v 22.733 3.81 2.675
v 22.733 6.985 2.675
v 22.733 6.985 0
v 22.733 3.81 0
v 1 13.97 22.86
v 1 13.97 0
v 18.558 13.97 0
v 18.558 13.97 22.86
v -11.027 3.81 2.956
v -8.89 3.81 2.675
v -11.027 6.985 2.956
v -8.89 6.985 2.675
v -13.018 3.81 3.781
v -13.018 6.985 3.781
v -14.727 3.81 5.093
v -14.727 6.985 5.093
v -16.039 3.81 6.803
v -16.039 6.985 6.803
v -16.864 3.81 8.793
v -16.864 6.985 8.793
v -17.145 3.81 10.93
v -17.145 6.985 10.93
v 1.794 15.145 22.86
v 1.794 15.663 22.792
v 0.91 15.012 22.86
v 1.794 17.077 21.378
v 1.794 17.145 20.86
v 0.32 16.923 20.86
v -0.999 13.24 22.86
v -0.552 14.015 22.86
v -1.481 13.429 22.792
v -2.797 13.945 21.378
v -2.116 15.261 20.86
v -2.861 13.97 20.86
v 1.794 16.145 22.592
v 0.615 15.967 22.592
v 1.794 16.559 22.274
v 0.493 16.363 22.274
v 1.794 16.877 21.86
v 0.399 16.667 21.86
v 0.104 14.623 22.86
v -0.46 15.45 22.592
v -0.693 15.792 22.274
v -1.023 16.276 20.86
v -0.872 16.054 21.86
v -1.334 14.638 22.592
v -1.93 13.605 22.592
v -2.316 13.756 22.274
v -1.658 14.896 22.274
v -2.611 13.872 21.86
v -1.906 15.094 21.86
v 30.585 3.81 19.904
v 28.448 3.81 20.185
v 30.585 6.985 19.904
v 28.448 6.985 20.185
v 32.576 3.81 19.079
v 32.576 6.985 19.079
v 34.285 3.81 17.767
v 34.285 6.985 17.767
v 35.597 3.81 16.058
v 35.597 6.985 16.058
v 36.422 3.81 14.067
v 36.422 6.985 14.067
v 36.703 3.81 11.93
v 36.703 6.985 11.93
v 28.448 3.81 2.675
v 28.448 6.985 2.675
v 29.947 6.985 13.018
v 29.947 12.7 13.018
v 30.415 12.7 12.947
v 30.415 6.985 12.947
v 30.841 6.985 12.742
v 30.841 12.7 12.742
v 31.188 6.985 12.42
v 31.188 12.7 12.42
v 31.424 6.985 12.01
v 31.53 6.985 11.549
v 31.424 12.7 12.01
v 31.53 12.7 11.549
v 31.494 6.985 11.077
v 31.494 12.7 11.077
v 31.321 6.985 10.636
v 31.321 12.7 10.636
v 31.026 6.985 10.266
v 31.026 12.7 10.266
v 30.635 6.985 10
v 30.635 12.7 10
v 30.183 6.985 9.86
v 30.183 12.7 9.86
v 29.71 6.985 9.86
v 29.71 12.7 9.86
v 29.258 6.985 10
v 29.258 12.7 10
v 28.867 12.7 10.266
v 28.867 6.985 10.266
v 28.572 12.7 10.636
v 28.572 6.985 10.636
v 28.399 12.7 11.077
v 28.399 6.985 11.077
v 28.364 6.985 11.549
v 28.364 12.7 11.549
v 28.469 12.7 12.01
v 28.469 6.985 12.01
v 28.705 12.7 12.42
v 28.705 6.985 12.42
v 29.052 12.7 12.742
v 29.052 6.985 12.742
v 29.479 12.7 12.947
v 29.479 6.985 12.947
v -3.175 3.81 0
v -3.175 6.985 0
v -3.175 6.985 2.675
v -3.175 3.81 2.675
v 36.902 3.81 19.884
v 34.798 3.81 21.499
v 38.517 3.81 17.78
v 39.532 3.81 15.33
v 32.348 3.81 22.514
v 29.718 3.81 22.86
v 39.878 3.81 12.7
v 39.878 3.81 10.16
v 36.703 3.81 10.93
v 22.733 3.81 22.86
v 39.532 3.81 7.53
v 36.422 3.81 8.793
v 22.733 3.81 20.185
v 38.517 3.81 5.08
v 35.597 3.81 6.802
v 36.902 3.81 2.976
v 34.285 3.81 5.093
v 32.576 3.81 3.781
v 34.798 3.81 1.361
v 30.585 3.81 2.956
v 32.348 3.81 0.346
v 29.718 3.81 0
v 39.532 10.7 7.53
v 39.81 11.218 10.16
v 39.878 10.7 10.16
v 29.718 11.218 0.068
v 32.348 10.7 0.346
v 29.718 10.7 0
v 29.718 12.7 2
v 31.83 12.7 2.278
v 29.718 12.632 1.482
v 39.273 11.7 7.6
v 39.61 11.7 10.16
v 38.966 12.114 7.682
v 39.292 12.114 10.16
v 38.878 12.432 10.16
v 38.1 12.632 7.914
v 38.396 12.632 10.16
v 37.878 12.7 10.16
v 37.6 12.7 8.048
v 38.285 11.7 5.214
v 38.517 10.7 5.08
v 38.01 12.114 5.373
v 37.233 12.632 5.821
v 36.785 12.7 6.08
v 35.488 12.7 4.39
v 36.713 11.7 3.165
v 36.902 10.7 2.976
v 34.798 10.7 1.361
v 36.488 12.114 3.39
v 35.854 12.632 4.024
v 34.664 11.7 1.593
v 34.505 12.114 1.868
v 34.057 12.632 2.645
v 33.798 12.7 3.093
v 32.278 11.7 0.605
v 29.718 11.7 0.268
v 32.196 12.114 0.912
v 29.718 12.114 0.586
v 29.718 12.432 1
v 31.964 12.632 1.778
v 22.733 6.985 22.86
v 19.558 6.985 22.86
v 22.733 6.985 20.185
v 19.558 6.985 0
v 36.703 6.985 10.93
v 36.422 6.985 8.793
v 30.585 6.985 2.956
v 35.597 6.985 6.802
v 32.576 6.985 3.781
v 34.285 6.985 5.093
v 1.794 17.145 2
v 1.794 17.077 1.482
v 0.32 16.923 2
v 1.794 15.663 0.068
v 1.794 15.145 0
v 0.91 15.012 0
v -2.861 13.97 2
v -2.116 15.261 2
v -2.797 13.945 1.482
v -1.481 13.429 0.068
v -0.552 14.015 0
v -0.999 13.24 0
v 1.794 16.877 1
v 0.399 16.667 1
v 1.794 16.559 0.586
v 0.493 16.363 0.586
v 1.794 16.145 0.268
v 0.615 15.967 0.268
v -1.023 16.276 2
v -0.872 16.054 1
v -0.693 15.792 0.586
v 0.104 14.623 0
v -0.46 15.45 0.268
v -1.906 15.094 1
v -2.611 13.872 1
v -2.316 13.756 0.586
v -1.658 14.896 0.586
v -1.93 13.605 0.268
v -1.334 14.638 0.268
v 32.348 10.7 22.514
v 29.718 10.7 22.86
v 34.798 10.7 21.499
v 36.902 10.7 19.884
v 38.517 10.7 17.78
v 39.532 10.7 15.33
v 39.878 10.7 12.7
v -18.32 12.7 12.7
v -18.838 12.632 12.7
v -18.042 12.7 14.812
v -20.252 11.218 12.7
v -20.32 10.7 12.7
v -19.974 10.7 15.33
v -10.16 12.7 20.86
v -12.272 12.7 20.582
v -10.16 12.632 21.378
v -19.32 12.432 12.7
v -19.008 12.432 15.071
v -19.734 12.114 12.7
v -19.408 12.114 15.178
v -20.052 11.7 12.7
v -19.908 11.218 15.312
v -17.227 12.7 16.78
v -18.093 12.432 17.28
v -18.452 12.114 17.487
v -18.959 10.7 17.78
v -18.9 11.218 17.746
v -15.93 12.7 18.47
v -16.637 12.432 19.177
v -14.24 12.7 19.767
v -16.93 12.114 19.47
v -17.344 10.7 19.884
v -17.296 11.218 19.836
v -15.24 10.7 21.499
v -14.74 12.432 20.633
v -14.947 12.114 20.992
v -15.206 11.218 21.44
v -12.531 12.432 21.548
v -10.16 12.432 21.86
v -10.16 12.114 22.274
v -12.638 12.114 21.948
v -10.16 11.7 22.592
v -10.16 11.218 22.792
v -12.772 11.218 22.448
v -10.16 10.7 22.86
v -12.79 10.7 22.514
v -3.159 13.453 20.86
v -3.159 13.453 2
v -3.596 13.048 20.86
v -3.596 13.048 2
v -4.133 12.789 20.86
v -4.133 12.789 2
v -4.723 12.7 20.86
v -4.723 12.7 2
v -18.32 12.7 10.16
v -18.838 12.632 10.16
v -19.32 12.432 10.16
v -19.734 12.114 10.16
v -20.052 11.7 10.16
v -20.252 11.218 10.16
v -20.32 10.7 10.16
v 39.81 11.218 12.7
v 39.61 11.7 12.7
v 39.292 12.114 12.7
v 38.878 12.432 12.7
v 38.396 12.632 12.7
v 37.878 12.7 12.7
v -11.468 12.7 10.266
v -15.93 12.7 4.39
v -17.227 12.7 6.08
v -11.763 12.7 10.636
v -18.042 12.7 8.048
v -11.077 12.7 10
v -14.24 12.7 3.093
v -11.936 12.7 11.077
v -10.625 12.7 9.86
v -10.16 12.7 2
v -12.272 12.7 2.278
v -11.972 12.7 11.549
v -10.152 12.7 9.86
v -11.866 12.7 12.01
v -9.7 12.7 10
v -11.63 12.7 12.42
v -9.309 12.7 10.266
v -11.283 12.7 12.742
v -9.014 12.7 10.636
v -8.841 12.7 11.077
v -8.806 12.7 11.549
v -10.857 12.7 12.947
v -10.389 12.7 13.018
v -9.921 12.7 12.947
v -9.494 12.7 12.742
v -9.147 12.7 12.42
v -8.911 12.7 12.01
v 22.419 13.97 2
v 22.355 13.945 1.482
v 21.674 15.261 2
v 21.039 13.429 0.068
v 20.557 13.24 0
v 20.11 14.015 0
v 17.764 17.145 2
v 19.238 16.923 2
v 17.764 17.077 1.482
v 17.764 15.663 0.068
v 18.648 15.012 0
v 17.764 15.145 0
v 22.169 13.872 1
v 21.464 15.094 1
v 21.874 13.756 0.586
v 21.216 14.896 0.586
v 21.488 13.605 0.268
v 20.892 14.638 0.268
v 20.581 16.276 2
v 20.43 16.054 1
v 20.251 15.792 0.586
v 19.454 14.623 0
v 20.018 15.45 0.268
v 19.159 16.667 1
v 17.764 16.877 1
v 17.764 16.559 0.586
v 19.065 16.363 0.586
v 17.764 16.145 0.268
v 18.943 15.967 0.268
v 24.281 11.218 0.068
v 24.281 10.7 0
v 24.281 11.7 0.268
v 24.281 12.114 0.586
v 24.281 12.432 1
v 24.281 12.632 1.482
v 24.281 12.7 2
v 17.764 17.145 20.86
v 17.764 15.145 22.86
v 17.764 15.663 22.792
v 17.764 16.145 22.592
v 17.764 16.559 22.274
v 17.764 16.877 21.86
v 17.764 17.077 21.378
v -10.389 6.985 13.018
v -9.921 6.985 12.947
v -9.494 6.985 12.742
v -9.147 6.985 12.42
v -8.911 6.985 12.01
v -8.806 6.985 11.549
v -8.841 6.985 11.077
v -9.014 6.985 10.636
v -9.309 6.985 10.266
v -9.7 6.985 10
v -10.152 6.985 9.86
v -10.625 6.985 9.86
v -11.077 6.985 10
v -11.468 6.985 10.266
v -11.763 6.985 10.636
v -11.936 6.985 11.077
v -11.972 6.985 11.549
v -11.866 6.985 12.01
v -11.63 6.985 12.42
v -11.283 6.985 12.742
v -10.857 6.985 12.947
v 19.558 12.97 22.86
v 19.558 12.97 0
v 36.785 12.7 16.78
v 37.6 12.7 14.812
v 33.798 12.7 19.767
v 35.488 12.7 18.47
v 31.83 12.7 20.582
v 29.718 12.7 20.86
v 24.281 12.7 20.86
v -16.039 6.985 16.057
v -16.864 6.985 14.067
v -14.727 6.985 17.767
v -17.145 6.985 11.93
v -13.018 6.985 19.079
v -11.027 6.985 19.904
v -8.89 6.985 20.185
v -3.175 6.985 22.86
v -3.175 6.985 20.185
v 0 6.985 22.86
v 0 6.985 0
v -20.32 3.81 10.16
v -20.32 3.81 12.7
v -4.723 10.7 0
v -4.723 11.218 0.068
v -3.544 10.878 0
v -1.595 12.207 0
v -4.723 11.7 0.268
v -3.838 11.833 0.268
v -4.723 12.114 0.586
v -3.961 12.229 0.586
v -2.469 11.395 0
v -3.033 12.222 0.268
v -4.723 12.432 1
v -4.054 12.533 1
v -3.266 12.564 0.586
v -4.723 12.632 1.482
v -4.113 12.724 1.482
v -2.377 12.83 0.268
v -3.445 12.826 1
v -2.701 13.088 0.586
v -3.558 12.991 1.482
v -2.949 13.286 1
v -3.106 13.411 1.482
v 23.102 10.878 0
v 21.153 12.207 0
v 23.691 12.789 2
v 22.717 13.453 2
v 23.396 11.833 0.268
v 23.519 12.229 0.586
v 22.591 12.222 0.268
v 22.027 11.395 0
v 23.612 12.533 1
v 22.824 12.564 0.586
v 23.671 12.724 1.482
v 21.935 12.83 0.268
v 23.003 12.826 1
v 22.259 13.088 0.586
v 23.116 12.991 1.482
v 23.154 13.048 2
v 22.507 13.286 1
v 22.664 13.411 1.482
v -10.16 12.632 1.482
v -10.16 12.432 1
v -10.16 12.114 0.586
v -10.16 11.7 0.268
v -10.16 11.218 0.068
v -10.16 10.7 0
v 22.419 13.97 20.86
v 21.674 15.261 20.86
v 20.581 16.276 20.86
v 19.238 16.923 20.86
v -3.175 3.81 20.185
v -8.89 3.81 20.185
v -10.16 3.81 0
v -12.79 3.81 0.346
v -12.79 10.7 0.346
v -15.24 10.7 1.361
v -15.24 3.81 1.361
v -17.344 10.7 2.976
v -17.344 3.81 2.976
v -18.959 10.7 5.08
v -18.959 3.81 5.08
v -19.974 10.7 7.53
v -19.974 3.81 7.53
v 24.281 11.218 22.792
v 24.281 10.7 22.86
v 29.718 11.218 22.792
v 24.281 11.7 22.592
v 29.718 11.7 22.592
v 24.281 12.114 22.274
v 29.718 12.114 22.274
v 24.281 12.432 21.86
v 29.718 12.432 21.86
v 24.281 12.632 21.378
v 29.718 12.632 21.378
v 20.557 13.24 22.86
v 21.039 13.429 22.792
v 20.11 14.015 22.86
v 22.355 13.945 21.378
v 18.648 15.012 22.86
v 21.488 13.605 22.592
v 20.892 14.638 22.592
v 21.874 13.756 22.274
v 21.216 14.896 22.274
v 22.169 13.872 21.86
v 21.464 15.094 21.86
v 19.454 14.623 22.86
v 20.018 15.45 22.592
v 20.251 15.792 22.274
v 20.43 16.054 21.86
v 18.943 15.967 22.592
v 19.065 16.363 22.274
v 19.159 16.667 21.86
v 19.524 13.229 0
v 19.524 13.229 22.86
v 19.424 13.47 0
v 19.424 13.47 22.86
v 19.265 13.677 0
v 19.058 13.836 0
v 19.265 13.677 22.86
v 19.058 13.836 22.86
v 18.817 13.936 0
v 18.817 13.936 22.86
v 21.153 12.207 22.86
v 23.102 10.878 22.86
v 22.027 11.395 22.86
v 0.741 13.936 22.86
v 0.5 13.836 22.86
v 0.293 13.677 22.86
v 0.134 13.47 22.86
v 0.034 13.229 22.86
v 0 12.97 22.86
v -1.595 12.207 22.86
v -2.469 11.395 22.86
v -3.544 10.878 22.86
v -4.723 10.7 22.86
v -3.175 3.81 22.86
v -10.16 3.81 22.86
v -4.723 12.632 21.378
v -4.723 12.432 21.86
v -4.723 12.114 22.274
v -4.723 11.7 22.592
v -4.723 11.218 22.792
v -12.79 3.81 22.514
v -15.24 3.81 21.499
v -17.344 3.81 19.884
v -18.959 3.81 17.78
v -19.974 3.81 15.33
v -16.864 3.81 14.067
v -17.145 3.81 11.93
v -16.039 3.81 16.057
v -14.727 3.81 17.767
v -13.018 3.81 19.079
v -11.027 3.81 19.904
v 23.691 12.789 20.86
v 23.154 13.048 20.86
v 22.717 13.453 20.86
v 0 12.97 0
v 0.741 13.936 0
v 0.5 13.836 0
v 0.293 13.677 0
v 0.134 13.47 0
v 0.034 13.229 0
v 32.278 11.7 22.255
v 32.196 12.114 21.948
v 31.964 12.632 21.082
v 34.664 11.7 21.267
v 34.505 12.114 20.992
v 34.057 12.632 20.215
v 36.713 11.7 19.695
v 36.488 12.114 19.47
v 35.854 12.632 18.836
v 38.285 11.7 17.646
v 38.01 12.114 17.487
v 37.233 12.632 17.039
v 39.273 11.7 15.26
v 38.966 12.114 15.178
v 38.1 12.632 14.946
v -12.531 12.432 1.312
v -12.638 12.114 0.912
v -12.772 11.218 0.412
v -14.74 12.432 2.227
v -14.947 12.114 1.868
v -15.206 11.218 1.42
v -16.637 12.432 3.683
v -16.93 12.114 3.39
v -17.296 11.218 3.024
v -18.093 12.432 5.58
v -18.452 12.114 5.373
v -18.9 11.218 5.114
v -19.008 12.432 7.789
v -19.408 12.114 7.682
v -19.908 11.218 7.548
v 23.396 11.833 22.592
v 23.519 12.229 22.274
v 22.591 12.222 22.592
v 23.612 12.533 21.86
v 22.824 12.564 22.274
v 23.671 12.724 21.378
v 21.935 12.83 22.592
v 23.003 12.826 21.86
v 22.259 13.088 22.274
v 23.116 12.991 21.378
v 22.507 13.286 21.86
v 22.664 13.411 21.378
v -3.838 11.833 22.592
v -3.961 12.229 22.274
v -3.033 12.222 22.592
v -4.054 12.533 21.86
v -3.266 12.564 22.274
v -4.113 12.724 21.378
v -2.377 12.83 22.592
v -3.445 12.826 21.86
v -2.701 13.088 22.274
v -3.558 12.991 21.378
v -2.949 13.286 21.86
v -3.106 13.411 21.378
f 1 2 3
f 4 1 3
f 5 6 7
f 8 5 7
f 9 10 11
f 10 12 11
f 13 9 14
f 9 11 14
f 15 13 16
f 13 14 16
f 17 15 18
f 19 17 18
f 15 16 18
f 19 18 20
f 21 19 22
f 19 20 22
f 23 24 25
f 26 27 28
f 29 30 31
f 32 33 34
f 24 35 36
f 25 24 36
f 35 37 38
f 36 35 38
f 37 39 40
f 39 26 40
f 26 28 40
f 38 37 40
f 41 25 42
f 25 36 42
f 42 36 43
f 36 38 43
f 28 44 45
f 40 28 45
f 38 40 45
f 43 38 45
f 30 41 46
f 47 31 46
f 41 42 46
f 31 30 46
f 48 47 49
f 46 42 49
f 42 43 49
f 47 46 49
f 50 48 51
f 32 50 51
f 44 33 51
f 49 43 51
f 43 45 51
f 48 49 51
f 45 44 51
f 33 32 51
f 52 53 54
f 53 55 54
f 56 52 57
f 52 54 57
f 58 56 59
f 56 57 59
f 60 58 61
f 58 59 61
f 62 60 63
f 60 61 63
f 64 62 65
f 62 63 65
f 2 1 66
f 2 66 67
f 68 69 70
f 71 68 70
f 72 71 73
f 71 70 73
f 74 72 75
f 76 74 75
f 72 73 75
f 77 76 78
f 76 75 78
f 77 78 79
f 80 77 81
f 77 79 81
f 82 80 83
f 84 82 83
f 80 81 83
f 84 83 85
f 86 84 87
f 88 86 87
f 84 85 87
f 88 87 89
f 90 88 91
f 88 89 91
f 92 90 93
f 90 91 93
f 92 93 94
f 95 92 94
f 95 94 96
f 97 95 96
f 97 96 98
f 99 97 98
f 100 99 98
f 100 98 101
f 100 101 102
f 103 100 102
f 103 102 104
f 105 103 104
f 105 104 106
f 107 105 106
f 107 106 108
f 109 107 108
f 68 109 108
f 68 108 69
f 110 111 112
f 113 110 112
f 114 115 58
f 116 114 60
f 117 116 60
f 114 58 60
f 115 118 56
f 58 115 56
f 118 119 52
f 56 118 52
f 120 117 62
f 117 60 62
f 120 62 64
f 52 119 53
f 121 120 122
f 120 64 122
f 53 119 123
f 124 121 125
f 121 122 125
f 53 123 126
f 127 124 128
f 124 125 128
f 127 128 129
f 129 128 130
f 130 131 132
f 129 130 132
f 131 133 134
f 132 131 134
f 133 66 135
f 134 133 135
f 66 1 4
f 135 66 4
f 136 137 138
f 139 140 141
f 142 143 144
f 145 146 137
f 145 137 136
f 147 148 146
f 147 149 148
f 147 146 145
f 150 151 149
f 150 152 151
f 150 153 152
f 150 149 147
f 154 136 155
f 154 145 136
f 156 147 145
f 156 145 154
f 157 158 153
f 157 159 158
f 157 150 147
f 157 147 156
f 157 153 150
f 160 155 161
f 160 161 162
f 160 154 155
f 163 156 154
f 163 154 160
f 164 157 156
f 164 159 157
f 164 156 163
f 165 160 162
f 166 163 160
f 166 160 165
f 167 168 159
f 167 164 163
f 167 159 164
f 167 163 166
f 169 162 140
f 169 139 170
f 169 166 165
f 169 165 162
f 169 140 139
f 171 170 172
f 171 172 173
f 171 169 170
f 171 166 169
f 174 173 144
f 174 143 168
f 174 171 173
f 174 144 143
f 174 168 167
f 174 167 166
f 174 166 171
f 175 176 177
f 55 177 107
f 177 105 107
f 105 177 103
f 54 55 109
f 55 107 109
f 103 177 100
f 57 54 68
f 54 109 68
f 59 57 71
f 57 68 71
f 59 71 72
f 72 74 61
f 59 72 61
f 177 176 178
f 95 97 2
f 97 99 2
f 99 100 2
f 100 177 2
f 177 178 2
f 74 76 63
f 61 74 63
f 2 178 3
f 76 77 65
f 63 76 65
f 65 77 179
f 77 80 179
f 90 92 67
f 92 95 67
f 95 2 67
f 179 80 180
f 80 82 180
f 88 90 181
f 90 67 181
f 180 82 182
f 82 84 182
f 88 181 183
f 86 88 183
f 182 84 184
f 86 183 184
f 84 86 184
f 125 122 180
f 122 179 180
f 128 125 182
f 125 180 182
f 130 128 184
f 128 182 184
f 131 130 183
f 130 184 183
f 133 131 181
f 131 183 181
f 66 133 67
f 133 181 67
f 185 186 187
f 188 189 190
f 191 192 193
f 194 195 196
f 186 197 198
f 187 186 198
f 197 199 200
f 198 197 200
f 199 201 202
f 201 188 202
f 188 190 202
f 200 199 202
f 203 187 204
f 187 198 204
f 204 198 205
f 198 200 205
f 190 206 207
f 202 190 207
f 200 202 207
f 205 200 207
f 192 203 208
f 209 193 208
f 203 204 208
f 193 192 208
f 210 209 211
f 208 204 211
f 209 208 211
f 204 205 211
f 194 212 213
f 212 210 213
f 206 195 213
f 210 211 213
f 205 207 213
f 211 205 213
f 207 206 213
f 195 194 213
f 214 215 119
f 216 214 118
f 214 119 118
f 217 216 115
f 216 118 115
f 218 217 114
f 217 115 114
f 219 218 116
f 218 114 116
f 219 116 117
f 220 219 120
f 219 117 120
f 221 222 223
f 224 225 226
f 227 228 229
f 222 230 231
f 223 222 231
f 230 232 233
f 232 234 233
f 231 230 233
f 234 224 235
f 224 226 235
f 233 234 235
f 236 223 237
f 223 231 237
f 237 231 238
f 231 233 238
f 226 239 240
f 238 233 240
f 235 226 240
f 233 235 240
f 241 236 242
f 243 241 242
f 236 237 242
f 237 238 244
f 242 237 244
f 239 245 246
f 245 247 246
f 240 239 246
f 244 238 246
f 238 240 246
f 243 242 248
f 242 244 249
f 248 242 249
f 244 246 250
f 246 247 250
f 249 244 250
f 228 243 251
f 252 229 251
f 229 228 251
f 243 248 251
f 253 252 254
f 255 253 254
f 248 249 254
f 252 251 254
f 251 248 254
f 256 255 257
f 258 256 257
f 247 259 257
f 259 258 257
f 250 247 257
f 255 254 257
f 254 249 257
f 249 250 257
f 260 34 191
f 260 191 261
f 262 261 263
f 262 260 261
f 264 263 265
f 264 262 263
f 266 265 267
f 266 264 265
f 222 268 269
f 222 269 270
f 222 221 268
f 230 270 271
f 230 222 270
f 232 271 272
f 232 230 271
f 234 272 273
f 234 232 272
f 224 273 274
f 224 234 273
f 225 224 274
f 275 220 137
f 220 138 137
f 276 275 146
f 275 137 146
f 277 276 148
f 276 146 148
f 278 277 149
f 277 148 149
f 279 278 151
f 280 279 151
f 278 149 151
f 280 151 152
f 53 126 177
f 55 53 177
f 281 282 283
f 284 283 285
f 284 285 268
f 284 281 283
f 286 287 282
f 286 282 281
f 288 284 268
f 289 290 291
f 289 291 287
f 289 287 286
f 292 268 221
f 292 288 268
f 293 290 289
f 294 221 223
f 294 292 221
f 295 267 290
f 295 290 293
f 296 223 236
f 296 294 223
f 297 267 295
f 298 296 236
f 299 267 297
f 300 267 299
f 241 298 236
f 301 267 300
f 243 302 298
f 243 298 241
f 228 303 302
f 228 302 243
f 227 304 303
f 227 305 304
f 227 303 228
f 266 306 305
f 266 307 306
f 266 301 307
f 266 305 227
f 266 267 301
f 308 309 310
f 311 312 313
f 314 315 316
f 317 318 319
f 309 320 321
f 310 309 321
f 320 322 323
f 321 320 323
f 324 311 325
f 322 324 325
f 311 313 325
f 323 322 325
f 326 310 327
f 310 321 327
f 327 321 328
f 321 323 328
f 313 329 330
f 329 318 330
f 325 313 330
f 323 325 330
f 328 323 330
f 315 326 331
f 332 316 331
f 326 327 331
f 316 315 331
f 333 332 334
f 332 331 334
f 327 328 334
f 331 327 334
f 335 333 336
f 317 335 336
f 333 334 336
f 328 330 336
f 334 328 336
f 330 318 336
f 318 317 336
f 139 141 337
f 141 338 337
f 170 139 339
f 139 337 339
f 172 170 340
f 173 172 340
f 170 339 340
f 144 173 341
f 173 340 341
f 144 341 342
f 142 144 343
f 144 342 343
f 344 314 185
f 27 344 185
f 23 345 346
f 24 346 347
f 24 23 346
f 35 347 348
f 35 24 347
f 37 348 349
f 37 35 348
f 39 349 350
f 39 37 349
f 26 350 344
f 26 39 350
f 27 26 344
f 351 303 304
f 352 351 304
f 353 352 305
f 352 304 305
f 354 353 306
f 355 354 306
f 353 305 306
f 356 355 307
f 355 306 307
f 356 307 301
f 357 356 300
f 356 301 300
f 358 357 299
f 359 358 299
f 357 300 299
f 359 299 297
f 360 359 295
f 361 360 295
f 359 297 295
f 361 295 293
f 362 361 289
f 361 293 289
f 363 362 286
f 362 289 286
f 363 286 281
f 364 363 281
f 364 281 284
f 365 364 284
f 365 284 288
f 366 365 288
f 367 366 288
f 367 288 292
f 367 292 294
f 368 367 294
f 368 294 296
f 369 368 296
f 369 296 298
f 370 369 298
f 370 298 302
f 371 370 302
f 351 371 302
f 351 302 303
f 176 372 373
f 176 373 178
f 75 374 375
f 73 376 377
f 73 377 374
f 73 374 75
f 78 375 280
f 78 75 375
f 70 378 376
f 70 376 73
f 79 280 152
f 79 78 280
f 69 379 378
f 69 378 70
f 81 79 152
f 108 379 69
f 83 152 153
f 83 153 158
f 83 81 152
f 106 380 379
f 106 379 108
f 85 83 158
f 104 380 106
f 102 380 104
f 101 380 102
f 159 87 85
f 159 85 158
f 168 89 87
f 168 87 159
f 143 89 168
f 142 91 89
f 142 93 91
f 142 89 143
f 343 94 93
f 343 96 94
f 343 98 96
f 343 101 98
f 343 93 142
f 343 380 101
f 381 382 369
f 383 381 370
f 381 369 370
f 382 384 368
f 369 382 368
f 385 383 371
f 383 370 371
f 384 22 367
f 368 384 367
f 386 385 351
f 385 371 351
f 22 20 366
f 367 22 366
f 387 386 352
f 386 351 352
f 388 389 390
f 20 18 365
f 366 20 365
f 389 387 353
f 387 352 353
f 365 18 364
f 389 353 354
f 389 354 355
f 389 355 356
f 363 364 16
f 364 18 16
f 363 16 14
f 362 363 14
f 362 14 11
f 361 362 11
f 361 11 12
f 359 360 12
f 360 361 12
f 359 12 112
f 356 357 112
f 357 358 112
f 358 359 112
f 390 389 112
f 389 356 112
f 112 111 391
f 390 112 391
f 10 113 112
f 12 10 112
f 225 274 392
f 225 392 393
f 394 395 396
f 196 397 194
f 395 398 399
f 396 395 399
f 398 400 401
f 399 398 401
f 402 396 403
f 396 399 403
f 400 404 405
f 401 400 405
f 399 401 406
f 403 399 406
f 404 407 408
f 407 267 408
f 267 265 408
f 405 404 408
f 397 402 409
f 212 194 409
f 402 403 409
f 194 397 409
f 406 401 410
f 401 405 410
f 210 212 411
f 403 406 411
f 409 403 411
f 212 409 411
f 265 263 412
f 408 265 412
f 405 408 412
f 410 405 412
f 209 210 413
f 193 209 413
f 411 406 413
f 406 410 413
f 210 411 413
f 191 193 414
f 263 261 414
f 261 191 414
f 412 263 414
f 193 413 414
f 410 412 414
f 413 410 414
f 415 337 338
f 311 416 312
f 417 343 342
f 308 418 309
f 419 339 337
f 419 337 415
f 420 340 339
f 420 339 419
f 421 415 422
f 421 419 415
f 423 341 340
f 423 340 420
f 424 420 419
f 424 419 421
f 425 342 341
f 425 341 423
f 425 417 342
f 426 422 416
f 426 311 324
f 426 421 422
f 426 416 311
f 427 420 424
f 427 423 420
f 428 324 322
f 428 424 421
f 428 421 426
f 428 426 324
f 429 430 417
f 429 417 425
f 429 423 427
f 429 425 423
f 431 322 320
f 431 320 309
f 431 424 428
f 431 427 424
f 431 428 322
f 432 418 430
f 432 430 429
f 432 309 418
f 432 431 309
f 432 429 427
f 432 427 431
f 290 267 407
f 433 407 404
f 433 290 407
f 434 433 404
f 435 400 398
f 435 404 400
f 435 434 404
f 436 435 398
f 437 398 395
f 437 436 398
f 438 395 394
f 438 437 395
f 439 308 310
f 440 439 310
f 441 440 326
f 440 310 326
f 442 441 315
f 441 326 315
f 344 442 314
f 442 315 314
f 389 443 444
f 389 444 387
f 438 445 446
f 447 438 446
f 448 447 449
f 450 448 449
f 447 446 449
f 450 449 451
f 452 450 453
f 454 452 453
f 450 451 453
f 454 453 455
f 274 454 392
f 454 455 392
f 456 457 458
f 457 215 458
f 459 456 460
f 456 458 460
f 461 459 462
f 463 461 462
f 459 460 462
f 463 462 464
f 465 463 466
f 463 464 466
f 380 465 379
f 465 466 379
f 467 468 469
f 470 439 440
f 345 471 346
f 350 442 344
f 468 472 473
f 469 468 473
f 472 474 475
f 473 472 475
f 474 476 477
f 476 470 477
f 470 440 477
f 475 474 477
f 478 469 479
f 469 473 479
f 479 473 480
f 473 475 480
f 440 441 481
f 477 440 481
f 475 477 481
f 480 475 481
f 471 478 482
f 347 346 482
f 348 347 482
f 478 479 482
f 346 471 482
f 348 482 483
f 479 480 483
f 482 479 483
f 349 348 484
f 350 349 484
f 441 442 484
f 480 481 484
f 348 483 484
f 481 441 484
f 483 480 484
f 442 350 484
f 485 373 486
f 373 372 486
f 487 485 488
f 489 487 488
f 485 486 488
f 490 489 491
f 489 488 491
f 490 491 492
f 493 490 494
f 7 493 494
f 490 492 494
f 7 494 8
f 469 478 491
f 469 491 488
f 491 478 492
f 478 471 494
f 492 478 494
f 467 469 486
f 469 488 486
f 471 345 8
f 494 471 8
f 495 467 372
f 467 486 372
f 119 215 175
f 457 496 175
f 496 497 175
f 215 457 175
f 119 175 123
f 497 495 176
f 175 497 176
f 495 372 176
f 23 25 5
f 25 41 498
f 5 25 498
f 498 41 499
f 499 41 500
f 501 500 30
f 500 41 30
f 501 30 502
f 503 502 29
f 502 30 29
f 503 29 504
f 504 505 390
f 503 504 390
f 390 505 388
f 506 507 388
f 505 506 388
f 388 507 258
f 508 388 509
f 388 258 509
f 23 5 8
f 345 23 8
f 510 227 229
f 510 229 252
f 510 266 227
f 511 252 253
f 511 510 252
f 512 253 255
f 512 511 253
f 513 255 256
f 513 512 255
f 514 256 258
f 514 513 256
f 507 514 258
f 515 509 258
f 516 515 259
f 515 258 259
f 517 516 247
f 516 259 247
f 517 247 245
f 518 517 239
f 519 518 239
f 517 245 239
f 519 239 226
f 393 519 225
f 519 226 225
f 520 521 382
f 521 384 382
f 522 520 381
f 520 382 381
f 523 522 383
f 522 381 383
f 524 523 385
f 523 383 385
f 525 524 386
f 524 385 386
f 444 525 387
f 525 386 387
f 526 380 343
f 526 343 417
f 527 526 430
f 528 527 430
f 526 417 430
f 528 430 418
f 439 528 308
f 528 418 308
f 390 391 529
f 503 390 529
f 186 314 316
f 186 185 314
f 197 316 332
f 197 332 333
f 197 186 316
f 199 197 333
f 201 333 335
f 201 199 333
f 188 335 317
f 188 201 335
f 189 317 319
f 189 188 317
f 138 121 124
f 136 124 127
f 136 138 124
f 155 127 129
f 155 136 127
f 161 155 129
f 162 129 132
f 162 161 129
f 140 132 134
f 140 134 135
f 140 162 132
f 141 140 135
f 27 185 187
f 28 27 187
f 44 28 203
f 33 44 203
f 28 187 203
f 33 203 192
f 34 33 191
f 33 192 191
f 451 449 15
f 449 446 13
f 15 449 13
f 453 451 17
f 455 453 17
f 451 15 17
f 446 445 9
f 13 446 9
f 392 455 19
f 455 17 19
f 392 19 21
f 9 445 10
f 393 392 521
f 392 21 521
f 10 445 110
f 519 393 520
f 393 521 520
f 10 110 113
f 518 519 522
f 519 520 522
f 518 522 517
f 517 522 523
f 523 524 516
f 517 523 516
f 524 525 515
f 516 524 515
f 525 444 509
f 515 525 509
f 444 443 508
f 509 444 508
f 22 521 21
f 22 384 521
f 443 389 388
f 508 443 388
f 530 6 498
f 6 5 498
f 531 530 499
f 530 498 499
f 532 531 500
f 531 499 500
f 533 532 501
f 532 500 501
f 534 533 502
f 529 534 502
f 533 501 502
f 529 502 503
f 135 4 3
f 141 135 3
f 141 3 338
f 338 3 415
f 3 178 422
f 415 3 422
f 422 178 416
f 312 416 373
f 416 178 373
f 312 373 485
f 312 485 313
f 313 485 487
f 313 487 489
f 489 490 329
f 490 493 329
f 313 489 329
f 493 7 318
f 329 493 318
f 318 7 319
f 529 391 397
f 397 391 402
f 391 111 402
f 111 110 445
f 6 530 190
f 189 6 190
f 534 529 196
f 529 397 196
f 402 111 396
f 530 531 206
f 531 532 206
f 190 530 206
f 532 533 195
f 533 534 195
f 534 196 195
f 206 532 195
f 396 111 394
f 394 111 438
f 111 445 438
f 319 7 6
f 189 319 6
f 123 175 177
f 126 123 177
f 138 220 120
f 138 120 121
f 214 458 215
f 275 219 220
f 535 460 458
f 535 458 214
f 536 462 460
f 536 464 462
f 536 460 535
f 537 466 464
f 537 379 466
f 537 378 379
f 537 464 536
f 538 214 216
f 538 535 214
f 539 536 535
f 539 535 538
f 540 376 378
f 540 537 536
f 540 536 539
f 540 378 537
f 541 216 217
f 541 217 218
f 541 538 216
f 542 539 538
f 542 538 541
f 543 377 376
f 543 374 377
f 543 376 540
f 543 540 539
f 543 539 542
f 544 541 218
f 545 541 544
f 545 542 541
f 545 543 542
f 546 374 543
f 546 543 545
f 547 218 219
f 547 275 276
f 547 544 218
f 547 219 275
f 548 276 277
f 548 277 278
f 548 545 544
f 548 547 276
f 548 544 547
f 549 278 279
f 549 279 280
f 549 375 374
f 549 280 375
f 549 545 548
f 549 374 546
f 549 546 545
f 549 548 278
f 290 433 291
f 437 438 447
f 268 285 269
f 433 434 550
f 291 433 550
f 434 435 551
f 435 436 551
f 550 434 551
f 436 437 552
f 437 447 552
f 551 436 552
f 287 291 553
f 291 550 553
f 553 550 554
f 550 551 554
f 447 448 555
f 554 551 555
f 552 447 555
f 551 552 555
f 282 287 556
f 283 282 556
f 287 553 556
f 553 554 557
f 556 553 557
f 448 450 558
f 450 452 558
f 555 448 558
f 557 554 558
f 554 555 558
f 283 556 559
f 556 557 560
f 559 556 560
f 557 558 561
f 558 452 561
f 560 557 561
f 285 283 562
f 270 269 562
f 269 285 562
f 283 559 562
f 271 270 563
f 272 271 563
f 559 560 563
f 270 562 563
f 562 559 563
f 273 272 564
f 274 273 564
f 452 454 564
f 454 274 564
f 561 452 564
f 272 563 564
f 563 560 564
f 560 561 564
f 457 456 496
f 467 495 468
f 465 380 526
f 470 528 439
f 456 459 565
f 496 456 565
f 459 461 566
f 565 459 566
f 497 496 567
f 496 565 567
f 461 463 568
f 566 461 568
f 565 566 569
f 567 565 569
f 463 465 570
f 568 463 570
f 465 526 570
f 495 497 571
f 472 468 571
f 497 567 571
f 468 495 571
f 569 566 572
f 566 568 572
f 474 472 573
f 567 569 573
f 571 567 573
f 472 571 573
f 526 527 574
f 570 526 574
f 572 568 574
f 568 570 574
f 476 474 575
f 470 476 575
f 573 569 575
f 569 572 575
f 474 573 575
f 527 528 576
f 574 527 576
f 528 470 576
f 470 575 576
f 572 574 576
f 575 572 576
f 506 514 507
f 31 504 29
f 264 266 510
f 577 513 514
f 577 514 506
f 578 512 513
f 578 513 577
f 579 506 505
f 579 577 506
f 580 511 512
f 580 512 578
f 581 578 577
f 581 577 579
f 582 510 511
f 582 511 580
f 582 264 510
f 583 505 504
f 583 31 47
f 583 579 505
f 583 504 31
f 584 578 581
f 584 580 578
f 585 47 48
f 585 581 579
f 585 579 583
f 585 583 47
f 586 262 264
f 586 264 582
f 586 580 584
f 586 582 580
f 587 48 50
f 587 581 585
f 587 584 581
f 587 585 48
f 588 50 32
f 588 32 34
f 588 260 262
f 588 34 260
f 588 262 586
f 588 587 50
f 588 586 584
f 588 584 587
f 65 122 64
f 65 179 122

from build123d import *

# Parameters (mm, degrees)
BOSS_EXTRUDE1_DEPTH = 22.86
SKETCH2_W           = 22.86
SKETCH2_H           = 5.715
SKETCH2_H_2         = 3.175
BOSS_EXTRUDE2_DEPTH = 17.145
SKETCH3_W           = 22.86
SKETCH3_H           = 5.715
SKETCH3_H_2         = 3.175
BOSS_EXTRUDE3_DEPTH = 17.145
SKETCH4_W           = 17.51
SKETCH4_H           = 3.175
CUT_EXTRUDE1_DEPTH  = 13.97
SKETCH5_W           = 17.51
SKETCH5_H           = 3.175
CUT_EXTRUDE2_DEPTH  = 13.97
SKETCH6_R           = 1.5875
CUT_EXTRUDE3_DEPTH  = 8.89
FILLET1_R           = 8.255
FILLET2_R           = 10.16
FILLET3_R           = 1
FILLET4_R           = 5
FILLET5_R           = 2


with BuildPart() as part:
    # Sketch1 → Boss-Extrude1 (new body)
    with BuildSketch(Plane.XY):
        Polygon((22.733, 17.145), (9.779, 17.145), (9.779, 13.97), (19.558, 13.97), (19.558, 6.985), (22.733, 6.985), align=None)
        Polygon((9.779, 13.97), (9.779, 17.145), (-3.175, 17.145), (-3.175, 6.985), (0, 6.985), (0, 13.97), align=None)
    extrude(amount=BOSS_EXTRUDE1_DEPTH)

    # Sketch2 → Boss-Extrude2 (add)
    with BuildSketch(Plane.ZY.offset(3.175)):
        with Locations((11.43, 9.8425)):
            Rectangle(SKETCH2_W, SKETCH2_H)
        with Locations((11.43, 5.3975)):
            Rectangle(SKETCH2_W, SKETCH2_H_2)
    extrude(amount=BOSS_EXTRUDE2_DEPTH)

    # Sketch3 → Boss-Extrude3 (add)
    with BuildSketch(Plane(origin=(22.733, 0, 0), x_dir=(0, 0, -1), z_dir=(1, 0, 0))):
        with Locations((-11.43, 9.8425)):
            Rectangle(SKETCH3_W, SKETCH3_H)
        with Locations((-11.43, 5.3975)):
            Rectangle(SKETCH3_W, SKETCH3_H_2)
    extrude(amount=BOSS_EXTRUDE3_DEPTH)

    # Sketch4 → Cut-Extrude1 (cut)
    with BuildSketch(Plane.ZY.offset(-22.733)):
        with Locations((11.43, 5.3975)):
            Rectangle(SKETCH4_W, SKETCH4_H)
    extrude(amount=-CUT_EXTRUDE1_DEPTH, mode=Mode.SUBTRACT)

    # Sketch5 → Cut-Extrude2 (cut)
    with BuildSketch(Plane(origin=(-3.175, 0, 0), x_dir=(0, 0, -1), z_dir=(1, 0, 0))):
        with Locations((-11.43, 5.3975)):
            Rectangle(SKETCH5_W, SKETCH5_H)
    extrude(amount=-CUT_EXTRUDE2_DEPTH, mode=Mode.SUBTRACT)

    # Sketch6 → Cut-Extrude3 (cut)
    with BuildSketch(Plane(origin=(0, 12.7, 0), x_dir=(1, 0, 0), z_dir=(0, 1, 0))):
        with Locations(Location((29.9466, -11.43, 0), (0, 0, 270))):
            Circle(SKETCH6_R)
        with Locations(Location((-10.3886, -11.43, 0), (0, 0, 270))):
            Circle(SKETCH6_R)
    extrude(amount=-CUT_EXTRUDE3_DEPTH, mode=Mode.SUBTRACT)

    # Fillet1
    fillet1_edges = [part.edges().sort_by_distance(p)[0] for p in [
        (36.703, 5.3975, 2.675),
        (36.703, 5.3975, 20.185),
        (-17.145, 5.3975, 20.185),
        (-17.145, 5.3975, 2.675),
    ]]
    fillet(fillet1_edges, radius=FILLET1_R)

    # Fillet2
    fillet2_edges = [part.edges().sort_by_distance(p)[0] for p in [
        (-20.32, 8.255, 22.86),
        (-20.32, 8.255, 0),
        (39.878, 8.255, 22.86),
        (39.878, 8.255, 0),
    ]]
    fillet(fillet2_edges, radius=FILLET2_R)

    # Fillet3
    fillet3_edges = [part.edges().sort_by_distance(p)[0] for p in [
        (19.558, 13.97, 11.43),
        (0, 13.97, 11.43),
    ]]
    fillet(fillet3_edges, radius=FILLET3_R)

    # Fillet4
    # the kernel refuses this fillet: 5 mm, written as the material it takes off along each edge
    with BuildSketch(Plane(origin=(22.733, 17.145, -12.422755079), x_dir=(-1, 0, 0), z_dir=(0, 0, 1))) as fillet4_piece_1:
        with BuildLine():
            CenterArc((4.969102032, 5), FILLET4_R, 186.372964386, 83.627035614)
            Line((0, 4.445), (-0.099382041, 4.4339))
            ThreePointArc((-0.099382041, 4.4339), (-0.1, 2.2225), (-0.1, 0))
            Line((-0.1, 0), (0, -0.1))
            Line((0, -0.1), (4.969102032, -0.1))
            Line((4.969102032, -0.1), (4.969102032, 0))
        make_face()
    extrude(amount=47.705510158, mode=Mode.SUBTRACT)
    with BuildSketch(Plane(origin=(-3.175, 17.145, -12.422755079), x_dir=(0, -1, 0), z_dir=(0, 0, 1))) as fillet4_piece_2:
        with BuildLine():
            CenterArc((5, 4.969102032), FILLET4_R, 180, 83.627035614)
            Line((0, 4.969102032), (-0.1, 4.969102032))
            Line((-0.1, 4.969102032), (-0.1, 0))
            Line((-0.1, 0), (0, -0.1))
            ThreePointArc((0, -0.1), (2.2225, -0.1), (4.4339, -0.099382041))
            Line((4.4339, -0.099382041), (4.445, 0))
        make_face()
    extrude(amount=47.705510158, mode=Mode.SUBTRACT)

    # Fillet5
    fillet5_edges = [part.edges().sort_by_distance(p)[0] for p in [
        (-20.32, 12.7, 11.43),
        (-6.6675, 12.7, 0),
        (-6.6675, 12.7, 22.86),
        (-17.344204897, 12.7, 2.975795103),
        (-17.344204897, 12.7, 19.884204897),
        (26.2255, 12.7, 22.86),
        (26.2255, 12.7, 0),
        (39.878, 12.7, 11.43),
        (36.902204897, 12.7, 2.975795103),
        (36.902204897, 12.7, 19.884204897),
        (9.779, 17.145, 0),
        (9.779, 17.145, 22.86),
        (-1.539439629, 15.871593619, 0),
        (21.097439629, 15.871593619, 0),
        (-1.539439629, 15.871593619, 22.86),
        (21.097439629, 15.871593619, 22.86),
        (-3.175, 12.7, 11.43),
        (22.733, 12.7, 11.43),
    ]]
    fillet(fillet5_edges, radius=FILLET5_R)


solid = part.part
